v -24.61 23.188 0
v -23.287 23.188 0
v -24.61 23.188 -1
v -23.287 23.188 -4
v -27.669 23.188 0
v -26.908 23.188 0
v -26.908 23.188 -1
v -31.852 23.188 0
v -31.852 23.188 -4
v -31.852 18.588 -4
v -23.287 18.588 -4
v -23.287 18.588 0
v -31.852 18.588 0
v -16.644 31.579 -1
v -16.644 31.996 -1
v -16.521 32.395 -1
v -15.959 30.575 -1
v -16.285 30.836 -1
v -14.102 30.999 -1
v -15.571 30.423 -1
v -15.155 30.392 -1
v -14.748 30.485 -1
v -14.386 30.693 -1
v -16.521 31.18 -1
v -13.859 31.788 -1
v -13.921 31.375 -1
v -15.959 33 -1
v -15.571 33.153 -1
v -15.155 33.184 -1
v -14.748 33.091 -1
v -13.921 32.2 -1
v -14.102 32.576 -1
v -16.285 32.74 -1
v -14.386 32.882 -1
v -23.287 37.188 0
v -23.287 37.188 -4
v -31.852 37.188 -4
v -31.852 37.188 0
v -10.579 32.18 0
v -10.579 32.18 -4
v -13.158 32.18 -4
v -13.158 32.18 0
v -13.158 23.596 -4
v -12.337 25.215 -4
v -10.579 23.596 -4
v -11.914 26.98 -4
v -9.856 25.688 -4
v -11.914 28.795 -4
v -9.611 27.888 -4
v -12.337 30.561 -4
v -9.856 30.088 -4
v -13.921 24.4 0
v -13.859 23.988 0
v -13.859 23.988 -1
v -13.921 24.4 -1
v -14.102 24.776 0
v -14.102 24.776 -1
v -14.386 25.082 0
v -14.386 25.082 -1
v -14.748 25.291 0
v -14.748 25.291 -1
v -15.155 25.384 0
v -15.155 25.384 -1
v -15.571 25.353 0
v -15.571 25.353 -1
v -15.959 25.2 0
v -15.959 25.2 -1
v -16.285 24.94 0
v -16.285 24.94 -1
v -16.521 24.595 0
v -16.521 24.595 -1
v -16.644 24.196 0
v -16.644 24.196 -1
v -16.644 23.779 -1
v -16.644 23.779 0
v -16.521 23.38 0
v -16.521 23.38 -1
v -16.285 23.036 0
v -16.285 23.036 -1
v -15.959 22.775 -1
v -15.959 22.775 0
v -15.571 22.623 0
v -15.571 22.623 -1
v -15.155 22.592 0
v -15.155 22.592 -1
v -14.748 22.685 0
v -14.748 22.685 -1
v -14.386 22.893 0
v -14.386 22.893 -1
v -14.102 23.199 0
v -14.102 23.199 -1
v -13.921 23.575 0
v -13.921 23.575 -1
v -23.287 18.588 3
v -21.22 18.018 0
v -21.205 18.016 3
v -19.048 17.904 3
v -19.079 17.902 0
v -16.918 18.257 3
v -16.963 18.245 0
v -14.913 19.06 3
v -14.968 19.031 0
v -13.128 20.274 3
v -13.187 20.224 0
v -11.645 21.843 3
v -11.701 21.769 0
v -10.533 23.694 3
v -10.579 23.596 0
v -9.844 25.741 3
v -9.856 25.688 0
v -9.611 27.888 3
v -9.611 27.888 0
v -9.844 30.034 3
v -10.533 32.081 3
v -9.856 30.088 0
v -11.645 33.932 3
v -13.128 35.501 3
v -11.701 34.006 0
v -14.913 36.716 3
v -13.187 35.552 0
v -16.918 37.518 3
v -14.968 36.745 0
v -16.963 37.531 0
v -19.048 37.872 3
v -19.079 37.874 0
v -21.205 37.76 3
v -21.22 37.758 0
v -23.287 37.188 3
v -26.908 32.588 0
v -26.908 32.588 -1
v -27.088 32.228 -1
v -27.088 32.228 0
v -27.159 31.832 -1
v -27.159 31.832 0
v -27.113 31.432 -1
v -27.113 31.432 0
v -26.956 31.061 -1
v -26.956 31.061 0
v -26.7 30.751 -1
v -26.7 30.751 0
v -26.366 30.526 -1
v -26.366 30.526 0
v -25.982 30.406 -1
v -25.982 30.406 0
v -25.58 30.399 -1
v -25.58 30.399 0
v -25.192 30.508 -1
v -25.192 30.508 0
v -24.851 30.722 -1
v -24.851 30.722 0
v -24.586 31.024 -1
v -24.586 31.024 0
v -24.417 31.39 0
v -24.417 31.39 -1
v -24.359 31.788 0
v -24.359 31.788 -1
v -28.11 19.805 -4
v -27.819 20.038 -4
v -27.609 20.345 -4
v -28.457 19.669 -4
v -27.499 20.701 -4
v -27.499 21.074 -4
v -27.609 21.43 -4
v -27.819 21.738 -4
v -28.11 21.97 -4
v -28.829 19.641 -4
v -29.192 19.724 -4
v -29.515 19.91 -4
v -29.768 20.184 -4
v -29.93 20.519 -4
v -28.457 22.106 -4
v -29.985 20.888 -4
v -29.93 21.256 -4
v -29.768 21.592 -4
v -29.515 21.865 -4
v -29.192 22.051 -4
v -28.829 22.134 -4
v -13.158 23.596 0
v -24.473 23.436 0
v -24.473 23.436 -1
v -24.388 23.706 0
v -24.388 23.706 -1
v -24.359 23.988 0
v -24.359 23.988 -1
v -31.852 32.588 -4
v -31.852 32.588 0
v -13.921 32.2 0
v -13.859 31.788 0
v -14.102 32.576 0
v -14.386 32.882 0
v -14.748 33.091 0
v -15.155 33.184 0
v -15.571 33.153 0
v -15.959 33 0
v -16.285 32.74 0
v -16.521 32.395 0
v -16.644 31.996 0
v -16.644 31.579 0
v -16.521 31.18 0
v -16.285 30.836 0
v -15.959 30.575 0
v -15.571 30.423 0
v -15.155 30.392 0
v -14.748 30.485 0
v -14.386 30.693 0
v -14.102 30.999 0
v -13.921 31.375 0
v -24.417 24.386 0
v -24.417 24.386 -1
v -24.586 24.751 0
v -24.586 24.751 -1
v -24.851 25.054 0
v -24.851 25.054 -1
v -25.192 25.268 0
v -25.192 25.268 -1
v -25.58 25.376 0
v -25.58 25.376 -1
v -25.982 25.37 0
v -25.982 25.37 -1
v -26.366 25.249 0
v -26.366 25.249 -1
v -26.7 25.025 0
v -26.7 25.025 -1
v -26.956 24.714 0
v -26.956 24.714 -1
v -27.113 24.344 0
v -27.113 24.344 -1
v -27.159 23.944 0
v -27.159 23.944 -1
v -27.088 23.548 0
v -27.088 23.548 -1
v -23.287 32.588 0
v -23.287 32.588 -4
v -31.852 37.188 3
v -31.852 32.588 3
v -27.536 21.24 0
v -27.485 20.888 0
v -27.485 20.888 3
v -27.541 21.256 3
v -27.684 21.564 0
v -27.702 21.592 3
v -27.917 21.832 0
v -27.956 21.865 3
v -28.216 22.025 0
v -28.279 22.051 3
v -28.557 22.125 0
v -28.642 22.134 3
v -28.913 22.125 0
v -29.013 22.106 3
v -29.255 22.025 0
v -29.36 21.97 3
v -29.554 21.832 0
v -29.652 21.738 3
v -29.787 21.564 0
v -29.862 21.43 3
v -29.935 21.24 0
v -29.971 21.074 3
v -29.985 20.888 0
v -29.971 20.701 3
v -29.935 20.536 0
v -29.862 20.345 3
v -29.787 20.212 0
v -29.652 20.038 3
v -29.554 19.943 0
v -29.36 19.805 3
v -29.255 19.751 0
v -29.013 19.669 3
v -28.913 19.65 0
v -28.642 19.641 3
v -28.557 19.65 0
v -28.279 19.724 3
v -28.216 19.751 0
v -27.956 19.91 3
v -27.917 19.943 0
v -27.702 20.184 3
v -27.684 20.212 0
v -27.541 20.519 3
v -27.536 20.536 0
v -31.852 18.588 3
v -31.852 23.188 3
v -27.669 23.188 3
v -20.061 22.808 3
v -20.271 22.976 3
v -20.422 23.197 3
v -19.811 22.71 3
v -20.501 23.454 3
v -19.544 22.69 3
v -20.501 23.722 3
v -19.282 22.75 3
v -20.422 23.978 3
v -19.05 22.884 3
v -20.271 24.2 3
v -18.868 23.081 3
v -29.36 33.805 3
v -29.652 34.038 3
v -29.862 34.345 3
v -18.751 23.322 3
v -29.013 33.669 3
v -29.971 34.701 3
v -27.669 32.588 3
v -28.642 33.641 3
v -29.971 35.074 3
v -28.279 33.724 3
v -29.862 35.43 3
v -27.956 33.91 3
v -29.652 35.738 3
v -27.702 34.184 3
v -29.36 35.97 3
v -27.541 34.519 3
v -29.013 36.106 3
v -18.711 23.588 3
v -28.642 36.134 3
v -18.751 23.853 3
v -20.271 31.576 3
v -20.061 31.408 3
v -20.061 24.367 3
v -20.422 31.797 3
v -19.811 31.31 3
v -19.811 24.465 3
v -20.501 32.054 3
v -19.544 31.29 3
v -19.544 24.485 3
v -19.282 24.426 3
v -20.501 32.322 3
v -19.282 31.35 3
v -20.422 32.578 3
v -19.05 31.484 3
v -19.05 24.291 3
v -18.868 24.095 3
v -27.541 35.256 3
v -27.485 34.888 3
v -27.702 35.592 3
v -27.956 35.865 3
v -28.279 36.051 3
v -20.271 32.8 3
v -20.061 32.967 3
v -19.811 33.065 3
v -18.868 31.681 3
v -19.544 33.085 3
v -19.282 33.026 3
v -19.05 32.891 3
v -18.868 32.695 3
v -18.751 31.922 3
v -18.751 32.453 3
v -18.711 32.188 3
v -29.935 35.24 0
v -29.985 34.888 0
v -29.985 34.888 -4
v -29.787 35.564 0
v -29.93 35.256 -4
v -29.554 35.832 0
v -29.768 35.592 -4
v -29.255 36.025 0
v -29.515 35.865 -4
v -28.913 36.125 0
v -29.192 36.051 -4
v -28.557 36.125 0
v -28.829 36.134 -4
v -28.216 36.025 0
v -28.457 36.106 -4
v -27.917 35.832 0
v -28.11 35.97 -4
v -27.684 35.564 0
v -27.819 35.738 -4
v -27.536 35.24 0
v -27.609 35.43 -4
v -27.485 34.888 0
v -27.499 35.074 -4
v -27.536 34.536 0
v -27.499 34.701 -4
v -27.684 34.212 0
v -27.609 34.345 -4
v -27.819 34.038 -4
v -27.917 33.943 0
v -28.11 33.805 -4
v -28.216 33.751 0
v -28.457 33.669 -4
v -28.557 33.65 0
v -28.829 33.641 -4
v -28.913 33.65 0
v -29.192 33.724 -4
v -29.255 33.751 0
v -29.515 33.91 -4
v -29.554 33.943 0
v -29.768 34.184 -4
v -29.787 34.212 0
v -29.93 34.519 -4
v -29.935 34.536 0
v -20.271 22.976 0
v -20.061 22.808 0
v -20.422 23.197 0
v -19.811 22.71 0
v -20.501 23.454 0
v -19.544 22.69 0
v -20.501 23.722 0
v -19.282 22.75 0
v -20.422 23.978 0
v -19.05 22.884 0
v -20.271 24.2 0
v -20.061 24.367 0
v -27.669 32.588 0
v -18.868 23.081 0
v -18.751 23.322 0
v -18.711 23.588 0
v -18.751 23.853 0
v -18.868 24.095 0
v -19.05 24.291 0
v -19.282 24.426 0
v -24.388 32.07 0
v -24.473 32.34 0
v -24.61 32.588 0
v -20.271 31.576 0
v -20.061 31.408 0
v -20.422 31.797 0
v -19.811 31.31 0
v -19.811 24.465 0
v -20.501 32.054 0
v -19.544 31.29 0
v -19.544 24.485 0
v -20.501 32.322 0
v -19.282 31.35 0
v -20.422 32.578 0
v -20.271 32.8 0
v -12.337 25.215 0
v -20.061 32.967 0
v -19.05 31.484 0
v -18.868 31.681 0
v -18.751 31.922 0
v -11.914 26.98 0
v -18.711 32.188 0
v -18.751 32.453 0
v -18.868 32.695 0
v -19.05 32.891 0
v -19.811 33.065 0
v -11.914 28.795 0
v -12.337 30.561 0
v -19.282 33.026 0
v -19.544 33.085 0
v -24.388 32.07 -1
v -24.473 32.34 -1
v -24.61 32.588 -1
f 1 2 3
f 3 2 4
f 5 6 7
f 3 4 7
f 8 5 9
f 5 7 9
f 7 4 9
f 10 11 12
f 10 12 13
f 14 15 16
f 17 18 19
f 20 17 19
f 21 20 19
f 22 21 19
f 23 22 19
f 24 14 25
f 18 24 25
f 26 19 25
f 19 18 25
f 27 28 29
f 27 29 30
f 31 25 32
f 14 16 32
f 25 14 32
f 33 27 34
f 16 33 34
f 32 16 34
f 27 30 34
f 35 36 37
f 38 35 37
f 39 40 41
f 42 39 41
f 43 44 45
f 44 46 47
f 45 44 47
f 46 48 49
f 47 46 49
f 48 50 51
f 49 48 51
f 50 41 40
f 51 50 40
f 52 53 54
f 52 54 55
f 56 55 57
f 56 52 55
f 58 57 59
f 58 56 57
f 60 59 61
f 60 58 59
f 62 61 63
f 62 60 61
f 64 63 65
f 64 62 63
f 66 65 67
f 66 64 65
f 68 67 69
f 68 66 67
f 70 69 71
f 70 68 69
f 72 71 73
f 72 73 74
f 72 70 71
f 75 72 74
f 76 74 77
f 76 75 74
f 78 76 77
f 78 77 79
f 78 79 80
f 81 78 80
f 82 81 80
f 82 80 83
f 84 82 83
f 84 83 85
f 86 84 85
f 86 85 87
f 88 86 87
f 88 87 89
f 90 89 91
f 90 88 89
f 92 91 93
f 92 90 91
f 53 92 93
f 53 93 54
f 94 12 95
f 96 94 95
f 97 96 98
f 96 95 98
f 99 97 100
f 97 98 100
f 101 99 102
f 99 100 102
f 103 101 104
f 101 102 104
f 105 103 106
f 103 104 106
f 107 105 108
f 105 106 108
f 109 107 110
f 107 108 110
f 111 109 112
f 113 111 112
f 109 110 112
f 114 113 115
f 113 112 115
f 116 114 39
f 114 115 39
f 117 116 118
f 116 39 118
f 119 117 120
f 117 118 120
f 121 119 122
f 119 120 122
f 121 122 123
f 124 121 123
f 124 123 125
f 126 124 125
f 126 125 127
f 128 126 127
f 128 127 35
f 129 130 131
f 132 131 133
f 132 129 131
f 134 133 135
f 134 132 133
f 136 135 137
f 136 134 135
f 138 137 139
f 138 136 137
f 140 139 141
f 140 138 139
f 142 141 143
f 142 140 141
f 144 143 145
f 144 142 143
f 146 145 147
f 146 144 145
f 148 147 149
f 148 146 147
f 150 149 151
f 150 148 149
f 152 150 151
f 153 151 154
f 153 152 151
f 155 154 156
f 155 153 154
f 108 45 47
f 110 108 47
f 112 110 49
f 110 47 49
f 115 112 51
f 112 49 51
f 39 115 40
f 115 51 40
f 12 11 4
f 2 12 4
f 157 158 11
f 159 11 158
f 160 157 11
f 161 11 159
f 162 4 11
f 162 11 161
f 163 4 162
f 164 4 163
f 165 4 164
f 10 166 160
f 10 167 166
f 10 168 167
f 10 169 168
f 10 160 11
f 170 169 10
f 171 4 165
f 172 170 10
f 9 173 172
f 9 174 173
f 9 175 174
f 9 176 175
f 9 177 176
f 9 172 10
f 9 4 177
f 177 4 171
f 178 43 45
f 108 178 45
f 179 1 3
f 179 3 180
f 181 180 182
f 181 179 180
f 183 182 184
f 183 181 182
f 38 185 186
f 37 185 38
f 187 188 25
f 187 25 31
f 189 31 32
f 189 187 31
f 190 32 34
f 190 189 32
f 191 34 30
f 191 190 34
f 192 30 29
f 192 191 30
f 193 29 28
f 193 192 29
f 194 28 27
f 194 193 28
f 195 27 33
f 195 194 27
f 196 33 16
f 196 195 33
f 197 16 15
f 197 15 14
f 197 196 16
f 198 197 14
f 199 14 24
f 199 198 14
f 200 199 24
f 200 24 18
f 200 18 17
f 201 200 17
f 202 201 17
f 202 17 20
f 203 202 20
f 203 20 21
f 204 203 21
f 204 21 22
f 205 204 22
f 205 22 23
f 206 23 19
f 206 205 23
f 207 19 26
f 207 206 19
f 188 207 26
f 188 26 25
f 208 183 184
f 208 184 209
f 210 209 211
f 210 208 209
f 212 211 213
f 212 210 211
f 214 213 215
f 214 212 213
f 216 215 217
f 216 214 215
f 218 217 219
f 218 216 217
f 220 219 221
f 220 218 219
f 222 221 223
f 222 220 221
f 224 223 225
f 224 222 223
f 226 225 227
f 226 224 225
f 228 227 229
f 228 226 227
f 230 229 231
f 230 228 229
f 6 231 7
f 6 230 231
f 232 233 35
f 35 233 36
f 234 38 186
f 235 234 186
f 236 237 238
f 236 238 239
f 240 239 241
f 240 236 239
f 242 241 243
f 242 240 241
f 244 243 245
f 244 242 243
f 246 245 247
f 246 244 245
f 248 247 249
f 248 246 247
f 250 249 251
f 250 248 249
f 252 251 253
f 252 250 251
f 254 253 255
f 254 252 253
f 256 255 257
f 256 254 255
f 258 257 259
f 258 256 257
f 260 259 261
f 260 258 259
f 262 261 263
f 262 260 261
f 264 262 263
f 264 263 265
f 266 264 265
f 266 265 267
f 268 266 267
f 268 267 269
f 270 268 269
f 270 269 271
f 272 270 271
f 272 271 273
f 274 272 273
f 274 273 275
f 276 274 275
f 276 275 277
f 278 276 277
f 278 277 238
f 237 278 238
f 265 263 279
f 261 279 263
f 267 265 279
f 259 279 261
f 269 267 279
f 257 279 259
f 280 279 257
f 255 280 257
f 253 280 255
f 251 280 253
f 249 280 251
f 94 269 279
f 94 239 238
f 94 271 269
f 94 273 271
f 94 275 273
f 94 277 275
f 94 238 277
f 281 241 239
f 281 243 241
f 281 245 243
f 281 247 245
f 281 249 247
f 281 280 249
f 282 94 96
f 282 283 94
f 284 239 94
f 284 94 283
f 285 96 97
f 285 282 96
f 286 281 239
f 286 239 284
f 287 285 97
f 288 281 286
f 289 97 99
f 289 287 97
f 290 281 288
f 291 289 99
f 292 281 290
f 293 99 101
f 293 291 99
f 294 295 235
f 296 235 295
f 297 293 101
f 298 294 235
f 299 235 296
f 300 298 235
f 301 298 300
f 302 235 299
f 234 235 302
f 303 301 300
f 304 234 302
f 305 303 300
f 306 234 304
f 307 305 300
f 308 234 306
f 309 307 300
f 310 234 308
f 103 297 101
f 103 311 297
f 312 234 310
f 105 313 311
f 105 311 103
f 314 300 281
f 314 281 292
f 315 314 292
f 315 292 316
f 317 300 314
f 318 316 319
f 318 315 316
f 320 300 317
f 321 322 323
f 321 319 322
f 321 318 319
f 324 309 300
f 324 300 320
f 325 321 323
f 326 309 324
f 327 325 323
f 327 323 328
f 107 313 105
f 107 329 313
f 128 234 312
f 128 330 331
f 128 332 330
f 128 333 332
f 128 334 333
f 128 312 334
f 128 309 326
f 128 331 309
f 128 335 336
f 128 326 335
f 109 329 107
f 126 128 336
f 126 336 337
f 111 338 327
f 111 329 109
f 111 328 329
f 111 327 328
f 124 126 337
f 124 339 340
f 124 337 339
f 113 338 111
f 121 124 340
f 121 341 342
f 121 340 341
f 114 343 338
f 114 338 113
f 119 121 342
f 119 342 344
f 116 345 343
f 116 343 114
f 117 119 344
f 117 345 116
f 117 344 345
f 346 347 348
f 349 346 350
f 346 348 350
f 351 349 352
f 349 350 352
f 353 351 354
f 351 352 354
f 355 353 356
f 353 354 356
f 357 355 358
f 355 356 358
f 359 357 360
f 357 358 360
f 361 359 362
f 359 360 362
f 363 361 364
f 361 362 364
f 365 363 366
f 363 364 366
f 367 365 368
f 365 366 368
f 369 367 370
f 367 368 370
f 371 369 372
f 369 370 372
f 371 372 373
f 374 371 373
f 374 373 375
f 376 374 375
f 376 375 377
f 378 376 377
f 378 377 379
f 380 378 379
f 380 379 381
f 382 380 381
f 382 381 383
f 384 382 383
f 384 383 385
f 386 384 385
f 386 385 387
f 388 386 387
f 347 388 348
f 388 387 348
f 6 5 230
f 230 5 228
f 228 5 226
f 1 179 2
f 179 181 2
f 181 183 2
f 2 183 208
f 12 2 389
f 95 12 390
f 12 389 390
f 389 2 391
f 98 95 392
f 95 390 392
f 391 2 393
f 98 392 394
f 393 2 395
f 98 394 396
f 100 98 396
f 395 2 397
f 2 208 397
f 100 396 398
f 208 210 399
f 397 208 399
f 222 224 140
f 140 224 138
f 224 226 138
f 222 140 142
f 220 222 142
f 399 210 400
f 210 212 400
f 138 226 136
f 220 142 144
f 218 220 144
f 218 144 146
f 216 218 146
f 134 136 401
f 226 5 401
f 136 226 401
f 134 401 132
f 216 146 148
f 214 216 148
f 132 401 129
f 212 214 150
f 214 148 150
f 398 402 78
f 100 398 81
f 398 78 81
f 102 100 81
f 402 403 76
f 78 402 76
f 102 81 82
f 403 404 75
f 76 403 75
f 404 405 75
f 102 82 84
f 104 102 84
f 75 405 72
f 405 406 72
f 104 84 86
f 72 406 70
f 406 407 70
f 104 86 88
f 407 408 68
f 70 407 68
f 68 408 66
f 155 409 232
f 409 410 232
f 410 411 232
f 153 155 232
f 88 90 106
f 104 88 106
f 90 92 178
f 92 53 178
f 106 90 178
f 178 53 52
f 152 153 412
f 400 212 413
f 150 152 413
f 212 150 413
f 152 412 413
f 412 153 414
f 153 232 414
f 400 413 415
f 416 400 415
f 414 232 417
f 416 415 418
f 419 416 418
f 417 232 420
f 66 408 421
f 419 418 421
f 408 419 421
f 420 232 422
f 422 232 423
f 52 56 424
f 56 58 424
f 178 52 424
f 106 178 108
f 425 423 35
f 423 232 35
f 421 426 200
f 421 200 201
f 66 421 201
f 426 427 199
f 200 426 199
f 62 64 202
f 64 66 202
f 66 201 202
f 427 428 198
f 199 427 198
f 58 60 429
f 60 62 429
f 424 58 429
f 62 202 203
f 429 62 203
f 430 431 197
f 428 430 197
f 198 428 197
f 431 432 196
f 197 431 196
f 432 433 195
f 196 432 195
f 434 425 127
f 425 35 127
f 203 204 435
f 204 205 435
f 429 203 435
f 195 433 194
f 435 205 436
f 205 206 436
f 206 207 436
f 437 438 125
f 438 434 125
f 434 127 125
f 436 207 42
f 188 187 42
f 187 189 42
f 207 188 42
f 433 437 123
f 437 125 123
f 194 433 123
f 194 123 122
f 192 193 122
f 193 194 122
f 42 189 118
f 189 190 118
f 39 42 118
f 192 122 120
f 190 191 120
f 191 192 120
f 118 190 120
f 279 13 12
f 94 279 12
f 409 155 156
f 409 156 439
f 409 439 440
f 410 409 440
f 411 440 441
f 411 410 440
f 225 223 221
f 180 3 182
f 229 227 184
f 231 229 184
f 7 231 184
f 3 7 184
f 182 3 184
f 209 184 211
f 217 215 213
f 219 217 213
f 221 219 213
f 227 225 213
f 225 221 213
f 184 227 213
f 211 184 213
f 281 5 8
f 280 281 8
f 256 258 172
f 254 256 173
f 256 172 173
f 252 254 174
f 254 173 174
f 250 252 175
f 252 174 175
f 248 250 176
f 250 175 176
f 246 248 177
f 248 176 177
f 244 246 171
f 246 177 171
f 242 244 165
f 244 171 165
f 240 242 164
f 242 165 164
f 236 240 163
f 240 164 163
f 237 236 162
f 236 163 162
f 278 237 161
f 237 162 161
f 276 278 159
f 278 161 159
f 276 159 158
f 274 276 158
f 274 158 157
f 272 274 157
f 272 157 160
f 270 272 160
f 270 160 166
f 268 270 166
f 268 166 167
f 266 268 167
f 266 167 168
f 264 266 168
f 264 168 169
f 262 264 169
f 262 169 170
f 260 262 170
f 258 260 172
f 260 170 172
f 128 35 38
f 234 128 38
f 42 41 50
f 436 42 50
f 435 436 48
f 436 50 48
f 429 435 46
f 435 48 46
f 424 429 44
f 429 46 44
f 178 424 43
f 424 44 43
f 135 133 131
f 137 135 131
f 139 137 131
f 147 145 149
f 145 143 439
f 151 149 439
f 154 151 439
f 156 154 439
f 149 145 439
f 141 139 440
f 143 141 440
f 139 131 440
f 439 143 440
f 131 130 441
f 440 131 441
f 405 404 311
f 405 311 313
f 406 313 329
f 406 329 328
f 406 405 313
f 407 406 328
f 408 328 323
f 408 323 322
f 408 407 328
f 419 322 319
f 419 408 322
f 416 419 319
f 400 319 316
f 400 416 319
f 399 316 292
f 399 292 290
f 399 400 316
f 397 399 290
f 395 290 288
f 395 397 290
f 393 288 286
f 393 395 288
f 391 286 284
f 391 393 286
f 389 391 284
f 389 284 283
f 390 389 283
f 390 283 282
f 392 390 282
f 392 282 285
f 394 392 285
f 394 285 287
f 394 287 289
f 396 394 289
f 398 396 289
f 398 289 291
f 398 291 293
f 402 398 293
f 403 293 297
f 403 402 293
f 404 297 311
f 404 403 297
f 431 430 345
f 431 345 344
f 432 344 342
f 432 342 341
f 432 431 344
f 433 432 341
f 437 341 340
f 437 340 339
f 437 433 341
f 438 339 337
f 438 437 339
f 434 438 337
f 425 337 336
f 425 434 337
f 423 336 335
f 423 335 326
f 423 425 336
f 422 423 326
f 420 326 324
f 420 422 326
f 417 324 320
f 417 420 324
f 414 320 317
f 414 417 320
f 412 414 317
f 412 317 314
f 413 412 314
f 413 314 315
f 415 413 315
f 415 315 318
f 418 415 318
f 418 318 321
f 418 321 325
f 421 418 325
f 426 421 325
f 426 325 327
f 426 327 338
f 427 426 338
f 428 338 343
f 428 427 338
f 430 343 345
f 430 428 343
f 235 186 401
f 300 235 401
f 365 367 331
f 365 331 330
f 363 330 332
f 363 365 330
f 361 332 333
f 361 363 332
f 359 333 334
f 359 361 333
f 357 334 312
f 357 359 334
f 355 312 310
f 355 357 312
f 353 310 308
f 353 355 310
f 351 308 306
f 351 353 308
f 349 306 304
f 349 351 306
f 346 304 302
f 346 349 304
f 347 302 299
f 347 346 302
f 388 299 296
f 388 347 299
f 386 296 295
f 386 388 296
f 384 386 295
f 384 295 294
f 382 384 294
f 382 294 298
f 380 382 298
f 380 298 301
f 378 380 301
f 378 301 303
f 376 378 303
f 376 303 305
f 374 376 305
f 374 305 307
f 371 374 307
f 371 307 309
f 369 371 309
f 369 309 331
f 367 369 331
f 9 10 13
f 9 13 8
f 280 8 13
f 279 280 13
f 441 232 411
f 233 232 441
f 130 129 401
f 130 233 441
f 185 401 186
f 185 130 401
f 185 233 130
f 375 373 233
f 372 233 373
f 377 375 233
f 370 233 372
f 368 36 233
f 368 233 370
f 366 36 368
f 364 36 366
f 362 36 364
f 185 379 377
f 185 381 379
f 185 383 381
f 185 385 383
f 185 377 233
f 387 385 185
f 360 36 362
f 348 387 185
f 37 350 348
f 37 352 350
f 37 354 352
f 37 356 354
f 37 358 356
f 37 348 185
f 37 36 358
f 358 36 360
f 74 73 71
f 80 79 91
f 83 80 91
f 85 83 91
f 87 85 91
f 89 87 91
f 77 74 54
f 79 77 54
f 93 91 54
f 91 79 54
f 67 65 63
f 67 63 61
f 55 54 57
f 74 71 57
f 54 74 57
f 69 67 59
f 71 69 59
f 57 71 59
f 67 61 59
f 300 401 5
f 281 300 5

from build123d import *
from build123d.topology import SkipClean

# Parameters (mm, degrees)
SKETCH_1_R      = 1.25
SKETCH_1_R_2    = 0.9
EXTRUDE_1_DEPTH = 3
SKETCH_1_3_R    = 1.4
EXTRUDE_2_DEPTH = 1
EXTRUDE_START   = 4
SKETCH_2_W      = 8.565343767
SKETCH_2_H      = 4.6
SKETCH_2_R      = 1.25
EXTRUDE_3_DEPTH = 4


with BuildPart() as part:
    # 草图1 → 凸台-拉伸1 (new body)
    with BuildSketch(Plane.XY):
        with BuildLine():
            Line((-23.28674194, 37.187768843), (-31.852085707, 37.187768843))
            Line((-31.852085707, 37.187768843), (-31.852085707, 32.587768843))
            Line((-31.852085707, 32.587768843), (-27.669115572, 32.587768843))
            Line((-27.669115572, 32.587768843), (-27.669115572, 23.187768843))
            Line((-27.669115572, 23.187768843), (-31.852085707, 23.187768843))
            Line((-31.852085707, 23.187768843), (-31.852085707, 18.587768843))
            Line((-31.852085707, 18.587768843), (-23.28674194, 18.587768843))
            ThreePointArc((-23.28674194, 18.587768843), (-9.61114675, 27.887768843), (-23.28674194, 37.187768843))
        make_face()
        with Locations((-28.735290545, 20.887768843)):
            Circle(SKETCH_1_R, mode=Mode.SUBTRACT)
        with Locations((-28.735290545, 34.887768843)):
            Circle(SKETCH_1_R, mode=Mode.SUBTRACT)
        with Locations((-19.61114675, 32.187768843)):
            Circle(SKETCH_1_R_2, mode=Mode.SUBTRACT)
        with Locations((-19.61114675, 23.587768843)):
            Circle(SKETCH_1_R_2, mode=Mode.SUBTRACT)
    extrude(amount=EXTRUDE_1_DEPTH)

    # 草图1<3> → 凸台-拉伸2 (add)
    with BuildSketch(Plane.XY):
        with Locations((-25.759188609, 31.787768843)):
            Circle(SKETCH_1_3_R)
        with Locations((-25.759188609, 23.987768843)):
            Circle(SKETCH_1_3_R)
        with Locations((-15.259188609, 23.987768843)):
            Circle(SKETCH_1_3_R)
        with Locations((-15.259188609, 31.787768843)):
            Circle(SKETCH_1_3_R)
    extrude(amount=-EXTRUDE_2_DEPTH)

    # 草图2 → 凸台-拉伸3 (add)
    # profile 1 of 3: a face of its own
    with SkipClean():  # the faces are left unmerged after this step: merging them gives an invalid solid
        with BuildSketch(Plane(origin=(0, 0, 0), x_dir=(-1, 0, 0), z_dir=(0, 0, -1)).offset(EXTRUDE_START)):
            with Locations((27.569413823, 20.887768843)):
                Rectangle(SKETCH_2_W, SKETCH_2_H)
            with Locations((28.735290545, 20.887768843)):
                Circle(SKETCH_2_R, mode=Mode.SUBTRACT)
        # profile 2 of 3: a face of its own
        with BuildSketch(Plane(origin=(0, 0, 0), x_dir=(-1, 0, 0), z_dir=(0, 0, -1)).offset(EXTRUDE_START)):
            with Locations((27.569413823, 34.887768843)):
                Rectangle(SKETCH_2_W, SKETCH_2_H)
            with Locations((28.735290545, 34.887768843)):
                Circle(SKETCH_2_R, mode=Mode.SUBTRACT)
        # profile 3 of 3: a face of its own
        with BuildSketch(Plane(origin=(0, 0, 0), x_dir=(-1, 0, 0), z_dir=(0, 0, -1)).offset(EXTRUDE_START)):
            with BuildLine():
                Line((10.578969282, 32.179594818), (13.158028914, 32.179594818))
                ThreePointArc((13.158028914, 32.179594818), (11.86114675, 27.887768843), (13.158028914, 23.595942869))
                Line((13.158028914, 23.595942869), (10.578969282, 23.595942869))
                ThreePointArc((10.578969282, 23.595942869), (9.61114675, 27.887768843), (10.578969282, 32.179594818))
            make_face()
        extrude(amount=-EXTRUDE_3_DEPTH)


solid = part.part
